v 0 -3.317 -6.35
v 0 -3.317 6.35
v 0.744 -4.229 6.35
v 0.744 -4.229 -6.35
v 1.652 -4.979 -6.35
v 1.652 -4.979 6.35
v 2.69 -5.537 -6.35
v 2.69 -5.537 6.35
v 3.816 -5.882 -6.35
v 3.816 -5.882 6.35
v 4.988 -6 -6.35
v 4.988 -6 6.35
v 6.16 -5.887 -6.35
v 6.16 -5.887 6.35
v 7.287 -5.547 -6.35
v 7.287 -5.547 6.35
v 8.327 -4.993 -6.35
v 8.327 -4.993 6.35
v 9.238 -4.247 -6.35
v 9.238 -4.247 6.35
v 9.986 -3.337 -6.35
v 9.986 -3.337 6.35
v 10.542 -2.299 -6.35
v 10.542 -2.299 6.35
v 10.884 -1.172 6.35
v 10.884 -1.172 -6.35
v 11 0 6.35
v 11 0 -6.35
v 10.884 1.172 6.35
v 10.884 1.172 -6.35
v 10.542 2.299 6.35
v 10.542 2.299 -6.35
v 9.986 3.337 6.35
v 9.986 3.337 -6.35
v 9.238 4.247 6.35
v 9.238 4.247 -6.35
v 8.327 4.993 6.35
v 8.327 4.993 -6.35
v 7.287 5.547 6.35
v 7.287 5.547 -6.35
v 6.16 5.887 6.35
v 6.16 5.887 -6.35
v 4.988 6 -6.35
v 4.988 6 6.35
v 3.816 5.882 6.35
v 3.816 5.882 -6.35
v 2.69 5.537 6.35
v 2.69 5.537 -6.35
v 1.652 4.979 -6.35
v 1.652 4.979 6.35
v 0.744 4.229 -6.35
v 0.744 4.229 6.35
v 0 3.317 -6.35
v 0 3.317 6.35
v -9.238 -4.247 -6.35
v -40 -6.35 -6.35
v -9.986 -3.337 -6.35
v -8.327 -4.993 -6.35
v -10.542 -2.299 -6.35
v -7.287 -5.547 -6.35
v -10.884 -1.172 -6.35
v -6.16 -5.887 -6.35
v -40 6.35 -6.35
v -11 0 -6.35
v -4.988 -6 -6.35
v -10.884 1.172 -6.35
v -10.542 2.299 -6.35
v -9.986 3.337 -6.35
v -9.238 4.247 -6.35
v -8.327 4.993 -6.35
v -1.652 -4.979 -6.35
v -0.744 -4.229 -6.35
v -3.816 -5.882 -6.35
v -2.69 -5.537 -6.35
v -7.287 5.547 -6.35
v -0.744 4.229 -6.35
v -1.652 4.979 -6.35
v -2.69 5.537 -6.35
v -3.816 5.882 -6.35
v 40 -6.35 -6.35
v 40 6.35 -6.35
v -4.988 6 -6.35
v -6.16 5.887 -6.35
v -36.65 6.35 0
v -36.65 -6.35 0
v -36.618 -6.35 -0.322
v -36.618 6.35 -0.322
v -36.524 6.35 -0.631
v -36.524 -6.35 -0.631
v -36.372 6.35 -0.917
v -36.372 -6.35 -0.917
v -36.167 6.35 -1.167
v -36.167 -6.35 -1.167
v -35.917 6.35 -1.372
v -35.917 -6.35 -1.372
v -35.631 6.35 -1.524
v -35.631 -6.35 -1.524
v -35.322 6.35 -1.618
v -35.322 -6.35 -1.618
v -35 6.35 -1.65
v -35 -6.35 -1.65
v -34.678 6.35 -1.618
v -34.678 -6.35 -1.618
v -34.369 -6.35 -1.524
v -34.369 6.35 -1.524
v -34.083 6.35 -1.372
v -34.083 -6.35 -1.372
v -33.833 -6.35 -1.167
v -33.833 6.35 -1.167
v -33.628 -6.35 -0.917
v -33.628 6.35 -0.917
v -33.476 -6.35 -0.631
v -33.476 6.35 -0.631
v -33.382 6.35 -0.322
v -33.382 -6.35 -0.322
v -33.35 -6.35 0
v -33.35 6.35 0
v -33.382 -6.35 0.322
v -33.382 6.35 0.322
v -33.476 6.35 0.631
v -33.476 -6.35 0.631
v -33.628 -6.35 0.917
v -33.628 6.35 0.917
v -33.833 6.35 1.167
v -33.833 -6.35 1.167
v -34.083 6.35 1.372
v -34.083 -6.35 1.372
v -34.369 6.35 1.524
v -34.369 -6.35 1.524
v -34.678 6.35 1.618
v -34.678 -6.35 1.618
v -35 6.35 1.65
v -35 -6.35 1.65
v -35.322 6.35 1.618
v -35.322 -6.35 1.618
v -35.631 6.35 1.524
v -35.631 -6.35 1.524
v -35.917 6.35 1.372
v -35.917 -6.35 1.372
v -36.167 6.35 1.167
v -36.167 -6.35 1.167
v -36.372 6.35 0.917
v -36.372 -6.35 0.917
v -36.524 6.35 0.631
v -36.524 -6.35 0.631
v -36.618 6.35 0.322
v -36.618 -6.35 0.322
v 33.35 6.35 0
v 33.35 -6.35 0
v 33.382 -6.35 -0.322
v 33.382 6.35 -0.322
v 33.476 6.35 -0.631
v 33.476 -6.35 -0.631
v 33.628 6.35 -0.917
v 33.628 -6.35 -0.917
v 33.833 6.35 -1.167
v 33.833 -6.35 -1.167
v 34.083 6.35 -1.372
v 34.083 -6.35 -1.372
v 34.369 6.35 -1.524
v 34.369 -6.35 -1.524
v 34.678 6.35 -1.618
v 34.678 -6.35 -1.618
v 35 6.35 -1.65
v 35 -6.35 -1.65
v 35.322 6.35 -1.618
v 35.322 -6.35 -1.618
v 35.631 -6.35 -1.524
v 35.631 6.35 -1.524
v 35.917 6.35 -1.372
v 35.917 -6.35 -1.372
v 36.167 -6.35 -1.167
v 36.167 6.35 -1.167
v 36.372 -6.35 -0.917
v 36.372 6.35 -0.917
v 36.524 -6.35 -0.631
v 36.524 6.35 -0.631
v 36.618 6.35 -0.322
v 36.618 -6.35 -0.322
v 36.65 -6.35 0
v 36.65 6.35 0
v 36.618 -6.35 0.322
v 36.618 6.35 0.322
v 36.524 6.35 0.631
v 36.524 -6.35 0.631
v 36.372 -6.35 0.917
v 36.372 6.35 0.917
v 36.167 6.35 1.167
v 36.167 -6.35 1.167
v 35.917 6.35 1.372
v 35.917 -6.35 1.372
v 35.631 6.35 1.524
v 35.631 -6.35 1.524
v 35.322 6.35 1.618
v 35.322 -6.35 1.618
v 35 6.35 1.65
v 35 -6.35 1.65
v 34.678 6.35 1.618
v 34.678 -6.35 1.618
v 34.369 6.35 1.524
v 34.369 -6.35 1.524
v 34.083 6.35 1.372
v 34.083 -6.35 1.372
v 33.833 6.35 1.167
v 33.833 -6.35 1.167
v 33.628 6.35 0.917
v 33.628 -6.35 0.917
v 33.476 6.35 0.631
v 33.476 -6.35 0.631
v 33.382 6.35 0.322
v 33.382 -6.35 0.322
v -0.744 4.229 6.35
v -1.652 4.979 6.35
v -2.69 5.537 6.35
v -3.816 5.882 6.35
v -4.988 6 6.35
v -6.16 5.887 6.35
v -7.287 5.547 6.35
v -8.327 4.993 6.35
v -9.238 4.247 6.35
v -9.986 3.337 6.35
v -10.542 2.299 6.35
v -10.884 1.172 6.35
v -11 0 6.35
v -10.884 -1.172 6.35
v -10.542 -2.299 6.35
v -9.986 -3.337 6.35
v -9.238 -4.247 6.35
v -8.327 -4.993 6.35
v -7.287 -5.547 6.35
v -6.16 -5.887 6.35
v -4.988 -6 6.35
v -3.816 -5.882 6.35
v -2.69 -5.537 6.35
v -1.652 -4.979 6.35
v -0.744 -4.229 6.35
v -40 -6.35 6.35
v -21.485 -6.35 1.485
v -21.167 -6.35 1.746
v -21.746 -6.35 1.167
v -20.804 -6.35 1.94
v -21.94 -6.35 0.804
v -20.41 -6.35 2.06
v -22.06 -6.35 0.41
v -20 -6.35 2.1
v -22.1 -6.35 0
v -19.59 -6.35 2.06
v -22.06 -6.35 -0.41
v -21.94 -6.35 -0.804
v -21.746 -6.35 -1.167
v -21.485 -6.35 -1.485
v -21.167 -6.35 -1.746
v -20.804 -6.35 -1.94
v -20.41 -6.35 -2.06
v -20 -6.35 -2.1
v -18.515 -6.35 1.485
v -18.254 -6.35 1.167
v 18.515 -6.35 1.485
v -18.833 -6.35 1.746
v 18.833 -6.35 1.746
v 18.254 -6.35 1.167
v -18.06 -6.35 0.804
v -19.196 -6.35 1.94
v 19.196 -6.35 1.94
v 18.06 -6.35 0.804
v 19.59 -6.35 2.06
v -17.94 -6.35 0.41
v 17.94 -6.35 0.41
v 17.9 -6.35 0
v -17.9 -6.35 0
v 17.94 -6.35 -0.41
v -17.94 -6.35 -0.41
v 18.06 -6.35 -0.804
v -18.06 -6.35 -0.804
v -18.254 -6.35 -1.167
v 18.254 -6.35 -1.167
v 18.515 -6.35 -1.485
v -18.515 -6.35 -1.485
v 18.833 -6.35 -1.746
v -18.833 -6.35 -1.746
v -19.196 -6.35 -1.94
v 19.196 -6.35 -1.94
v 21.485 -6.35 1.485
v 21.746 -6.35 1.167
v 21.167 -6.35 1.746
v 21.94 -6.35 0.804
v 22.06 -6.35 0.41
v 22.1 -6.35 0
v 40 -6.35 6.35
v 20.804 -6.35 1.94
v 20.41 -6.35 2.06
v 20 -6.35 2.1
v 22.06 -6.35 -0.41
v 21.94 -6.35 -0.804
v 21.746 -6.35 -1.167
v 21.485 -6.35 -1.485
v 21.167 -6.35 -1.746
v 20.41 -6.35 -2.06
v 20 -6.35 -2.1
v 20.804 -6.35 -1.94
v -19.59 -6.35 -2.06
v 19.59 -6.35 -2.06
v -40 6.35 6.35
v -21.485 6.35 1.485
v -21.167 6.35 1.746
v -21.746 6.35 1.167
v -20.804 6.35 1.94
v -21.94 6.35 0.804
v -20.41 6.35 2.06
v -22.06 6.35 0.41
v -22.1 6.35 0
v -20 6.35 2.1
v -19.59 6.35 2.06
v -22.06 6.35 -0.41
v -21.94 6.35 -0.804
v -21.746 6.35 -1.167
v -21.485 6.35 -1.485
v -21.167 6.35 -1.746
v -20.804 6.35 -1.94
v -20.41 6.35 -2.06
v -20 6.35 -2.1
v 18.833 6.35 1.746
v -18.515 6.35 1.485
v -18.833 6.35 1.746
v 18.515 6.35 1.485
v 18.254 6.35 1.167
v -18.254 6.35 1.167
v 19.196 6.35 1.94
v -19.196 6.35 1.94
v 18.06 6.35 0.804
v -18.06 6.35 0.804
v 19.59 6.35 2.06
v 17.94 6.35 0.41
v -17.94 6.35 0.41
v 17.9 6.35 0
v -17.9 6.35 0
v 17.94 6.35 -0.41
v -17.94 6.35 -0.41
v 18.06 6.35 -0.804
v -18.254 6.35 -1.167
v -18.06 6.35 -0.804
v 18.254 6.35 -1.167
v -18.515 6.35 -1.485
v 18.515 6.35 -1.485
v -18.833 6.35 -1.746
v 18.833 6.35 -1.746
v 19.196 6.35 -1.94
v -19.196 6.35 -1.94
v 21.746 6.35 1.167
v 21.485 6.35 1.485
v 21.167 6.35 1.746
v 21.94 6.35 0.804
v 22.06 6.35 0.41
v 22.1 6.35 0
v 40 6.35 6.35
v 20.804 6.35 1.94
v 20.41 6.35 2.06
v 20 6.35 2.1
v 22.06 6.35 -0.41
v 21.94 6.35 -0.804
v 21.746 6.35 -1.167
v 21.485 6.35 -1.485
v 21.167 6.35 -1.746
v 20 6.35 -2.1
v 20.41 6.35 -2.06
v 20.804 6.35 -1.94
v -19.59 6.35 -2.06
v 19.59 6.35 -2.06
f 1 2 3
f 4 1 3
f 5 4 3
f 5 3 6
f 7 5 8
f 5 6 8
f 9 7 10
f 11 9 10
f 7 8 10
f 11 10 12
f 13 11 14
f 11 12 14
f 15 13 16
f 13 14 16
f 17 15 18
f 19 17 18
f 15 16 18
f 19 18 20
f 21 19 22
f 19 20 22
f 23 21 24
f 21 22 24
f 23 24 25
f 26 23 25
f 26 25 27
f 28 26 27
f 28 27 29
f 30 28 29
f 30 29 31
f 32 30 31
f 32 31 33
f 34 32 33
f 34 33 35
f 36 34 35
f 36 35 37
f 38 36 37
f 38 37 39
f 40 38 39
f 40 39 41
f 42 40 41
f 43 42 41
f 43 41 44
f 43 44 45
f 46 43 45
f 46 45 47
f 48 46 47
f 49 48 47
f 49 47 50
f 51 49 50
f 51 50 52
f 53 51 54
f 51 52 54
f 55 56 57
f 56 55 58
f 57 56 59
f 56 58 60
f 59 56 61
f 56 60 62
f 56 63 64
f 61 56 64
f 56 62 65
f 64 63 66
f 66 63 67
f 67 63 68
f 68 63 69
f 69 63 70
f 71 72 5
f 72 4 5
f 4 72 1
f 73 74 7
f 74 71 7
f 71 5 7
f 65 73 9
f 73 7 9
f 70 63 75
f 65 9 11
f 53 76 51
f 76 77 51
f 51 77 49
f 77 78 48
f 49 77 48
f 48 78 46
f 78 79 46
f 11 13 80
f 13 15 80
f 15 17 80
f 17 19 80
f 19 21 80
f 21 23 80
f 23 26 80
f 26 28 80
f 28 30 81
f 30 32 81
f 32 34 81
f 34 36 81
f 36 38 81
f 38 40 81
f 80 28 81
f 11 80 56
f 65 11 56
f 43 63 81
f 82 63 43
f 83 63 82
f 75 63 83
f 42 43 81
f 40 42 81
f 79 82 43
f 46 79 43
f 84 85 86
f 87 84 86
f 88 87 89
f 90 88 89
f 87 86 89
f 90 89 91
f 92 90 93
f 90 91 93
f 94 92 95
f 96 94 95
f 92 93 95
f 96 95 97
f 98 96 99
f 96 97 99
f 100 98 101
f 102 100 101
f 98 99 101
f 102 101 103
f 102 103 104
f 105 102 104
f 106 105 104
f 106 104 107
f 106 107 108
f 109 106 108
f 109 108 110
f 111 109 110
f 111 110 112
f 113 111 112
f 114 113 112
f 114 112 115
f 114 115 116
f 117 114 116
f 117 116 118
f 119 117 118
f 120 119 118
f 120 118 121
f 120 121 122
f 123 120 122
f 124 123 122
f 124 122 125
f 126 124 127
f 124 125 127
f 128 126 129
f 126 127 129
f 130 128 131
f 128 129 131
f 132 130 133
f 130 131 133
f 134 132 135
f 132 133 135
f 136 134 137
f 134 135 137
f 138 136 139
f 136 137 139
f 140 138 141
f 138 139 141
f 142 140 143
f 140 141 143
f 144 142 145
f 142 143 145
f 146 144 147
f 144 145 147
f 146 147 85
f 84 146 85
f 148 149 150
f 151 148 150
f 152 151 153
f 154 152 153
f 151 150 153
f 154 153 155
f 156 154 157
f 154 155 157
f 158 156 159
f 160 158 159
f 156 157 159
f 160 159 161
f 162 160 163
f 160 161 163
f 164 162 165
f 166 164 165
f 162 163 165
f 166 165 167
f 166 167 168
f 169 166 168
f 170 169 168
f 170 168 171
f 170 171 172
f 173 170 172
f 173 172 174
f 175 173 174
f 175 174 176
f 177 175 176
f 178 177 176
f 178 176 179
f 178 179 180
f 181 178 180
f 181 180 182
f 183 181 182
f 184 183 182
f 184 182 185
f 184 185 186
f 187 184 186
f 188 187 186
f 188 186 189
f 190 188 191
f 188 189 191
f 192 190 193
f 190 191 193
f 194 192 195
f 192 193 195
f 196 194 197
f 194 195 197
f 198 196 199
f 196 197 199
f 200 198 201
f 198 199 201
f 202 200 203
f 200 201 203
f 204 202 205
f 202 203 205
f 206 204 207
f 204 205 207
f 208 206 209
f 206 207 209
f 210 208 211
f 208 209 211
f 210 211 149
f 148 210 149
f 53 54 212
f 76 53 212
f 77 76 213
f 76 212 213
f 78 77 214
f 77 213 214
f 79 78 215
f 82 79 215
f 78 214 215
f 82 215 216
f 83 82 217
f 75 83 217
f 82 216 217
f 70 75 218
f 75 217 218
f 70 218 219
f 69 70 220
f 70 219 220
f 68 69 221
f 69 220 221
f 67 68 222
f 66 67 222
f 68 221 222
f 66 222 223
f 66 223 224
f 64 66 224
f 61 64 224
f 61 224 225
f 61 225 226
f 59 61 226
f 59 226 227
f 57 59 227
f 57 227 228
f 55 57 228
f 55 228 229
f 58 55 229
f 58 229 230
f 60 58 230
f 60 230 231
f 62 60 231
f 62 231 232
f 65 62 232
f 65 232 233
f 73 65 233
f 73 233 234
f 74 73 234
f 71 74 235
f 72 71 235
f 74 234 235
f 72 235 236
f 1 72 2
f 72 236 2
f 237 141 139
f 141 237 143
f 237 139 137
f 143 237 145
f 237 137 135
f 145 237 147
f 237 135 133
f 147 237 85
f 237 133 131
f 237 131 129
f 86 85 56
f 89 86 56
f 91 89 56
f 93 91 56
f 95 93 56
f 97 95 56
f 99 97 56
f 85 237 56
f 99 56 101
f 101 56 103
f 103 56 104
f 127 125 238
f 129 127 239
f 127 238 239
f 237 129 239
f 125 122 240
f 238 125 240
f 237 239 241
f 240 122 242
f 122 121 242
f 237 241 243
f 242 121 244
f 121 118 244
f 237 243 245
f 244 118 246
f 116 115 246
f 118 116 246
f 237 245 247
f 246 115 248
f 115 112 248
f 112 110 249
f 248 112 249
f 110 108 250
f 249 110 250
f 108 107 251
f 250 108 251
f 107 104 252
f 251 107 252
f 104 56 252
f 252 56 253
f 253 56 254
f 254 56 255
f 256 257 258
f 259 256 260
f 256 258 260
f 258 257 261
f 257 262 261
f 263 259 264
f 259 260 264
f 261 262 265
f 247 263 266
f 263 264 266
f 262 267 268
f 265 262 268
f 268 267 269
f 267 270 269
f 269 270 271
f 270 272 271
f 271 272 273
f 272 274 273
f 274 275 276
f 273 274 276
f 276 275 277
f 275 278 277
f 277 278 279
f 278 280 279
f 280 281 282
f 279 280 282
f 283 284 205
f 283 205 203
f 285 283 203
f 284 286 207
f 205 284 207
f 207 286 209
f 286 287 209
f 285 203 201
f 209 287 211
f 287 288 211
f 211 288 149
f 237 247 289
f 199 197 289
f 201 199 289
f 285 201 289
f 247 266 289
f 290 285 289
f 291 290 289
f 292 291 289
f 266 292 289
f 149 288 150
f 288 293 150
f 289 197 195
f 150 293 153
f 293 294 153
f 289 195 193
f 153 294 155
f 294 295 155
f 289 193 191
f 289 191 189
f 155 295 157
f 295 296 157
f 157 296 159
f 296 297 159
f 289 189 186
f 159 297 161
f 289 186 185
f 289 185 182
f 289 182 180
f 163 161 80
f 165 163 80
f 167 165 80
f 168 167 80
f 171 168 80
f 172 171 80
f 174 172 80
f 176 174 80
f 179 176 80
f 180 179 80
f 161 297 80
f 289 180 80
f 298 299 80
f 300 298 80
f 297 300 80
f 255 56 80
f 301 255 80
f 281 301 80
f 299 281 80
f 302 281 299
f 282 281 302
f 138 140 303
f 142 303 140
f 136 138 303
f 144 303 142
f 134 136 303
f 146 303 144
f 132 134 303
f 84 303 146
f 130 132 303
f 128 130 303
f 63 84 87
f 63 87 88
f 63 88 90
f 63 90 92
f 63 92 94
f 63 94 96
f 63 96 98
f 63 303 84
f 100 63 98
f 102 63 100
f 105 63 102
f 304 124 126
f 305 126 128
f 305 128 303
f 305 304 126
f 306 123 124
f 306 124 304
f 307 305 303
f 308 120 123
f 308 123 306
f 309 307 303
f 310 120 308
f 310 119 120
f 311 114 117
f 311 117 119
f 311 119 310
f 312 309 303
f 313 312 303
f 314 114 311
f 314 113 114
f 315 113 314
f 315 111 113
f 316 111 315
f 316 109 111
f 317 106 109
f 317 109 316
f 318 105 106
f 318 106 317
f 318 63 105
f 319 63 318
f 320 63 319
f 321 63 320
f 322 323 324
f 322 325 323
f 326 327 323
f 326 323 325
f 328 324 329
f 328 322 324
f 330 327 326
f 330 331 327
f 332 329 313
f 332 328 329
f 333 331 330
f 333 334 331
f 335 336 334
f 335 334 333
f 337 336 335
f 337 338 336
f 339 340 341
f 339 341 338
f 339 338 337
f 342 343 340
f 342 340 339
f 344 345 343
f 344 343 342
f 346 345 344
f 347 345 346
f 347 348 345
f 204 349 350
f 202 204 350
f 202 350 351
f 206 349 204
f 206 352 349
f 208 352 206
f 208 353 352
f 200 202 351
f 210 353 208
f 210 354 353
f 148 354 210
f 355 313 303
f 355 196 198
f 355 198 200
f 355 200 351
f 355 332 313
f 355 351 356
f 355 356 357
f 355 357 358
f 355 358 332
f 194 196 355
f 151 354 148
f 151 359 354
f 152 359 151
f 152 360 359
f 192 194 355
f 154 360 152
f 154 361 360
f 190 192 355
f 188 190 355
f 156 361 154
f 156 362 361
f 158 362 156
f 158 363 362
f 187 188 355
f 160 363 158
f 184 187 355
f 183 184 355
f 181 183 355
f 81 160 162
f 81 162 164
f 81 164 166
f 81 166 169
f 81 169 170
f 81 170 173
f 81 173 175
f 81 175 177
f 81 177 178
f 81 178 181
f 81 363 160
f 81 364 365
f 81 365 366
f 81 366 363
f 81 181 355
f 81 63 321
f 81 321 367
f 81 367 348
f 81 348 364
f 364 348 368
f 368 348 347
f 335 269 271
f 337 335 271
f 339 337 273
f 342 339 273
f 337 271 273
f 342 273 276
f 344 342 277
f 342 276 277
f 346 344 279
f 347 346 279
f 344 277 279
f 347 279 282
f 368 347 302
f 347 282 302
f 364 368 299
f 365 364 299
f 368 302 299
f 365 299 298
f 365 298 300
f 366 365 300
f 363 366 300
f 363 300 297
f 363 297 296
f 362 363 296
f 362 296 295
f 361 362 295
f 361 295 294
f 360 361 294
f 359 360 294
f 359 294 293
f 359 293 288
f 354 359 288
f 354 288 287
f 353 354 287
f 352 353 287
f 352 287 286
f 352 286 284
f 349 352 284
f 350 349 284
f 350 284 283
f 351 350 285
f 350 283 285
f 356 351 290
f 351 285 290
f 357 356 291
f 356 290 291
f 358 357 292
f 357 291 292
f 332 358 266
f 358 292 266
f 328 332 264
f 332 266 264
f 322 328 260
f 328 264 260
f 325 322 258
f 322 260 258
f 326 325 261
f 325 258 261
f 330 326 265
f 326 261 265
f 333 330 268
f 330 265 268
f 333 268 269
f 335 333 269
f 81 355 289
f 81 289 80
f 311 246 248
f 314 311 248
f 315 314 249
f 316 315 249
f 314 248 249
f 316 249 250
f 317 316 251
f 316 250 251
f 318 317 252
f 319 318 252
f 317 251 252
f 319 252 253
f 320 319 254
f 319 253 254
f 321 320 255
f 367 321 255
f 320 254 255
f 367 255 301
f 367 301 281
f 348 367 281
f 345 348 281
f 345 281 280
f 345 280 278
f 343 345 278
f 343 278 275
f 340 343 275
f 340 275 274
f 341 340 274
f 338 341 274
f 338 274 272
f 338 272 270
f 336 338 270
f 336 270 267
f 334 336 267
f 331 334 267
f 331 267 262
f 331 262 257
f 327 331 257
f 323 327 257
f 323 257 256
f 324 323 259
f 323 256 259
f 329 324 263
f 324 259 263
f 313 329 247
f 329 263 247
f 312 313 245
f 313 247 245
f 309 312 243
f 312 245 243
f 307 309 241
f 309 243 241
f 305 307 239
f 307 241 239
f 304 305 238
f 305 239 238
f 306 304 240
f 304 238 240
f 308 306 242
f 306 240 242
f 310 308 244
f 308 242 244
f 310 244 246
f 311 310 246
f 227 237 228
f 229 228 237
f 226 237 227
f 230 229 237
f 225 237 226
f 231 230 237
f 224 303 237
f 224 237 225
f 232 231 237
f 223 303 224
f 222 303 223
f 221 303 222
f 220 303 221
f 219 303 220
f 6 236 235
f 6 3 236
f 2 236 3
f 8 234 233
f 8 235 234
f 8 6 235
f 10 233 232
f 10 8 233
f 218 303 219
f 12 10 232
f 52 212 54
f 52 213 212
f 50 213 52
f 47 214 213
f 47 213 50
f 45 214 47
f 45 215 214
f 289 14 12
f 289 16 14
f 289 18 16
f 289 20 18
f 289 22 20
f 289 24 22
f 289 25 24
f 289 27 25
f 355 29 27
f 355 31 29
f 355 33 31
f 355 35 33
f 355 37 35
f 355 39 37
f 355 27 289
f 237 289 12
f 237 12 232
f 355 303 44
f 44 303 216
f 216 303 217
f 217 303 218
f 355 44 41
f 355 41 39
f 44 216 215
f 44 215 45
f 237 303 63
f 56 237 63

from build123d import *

# Parameters (mm, degrees)
SKETCH1_W                 = 80
SKETCH1_H                 = 12.7
BOSS_EXTRUDE1_DEPTH       = 6.35
SKETCH2_R                 = 6
CUT_EXTRUDE1_DEPTH        = 13.7
M4X0_7_TAPPED_HOLE2_D     = 3.3
M4X0_7_TAPPED_HOLE2_DEPTH = 12.7
M5X0_8_TAPPED_HOLE2_D     = 4.2
M5X0_8_TAPPED_HOLE2_DEPTH = 12.7


with BuildPart() as part:
    # Sketch1 → Boss-Extrude1 (new body, symmetric)
    with BuildSketch(Plane(origin=(0, 0, 0), x_dir=(1, 0, 0), z_dir=(0, 1, 0))):
        Rectangle(SKETCH1_W, SKETCH1_H)
    extrude(amount=BOSS_EXTRUDE1_DEPTH, both=True)

    # Sketch2 → Cut-Extrude1 (cut, through all)
    with BuildSketch(Plane.XY.offset(6.35)):
        with Locations((-5, 0)):
            Circle(SKETCH2_R)
        with Locations((5, 0)):
            Circle(SKETCH2_R)
    extrude(amount=-CUT_EXTRUDE1_DEPTH, mode=Mode.SUBTRACT)

    # M4x0.7 Tapped Hole2
    with Locations(Plane(origin=(0, 6.35, 0), x_dir=(1, 0, 0), z_dir=(0, 1, 0))):
        with Locations((-35, 0), (35, 0)):
            Hole(M4X0_7_TAPPED_HOLE2_D / 2, depth=M4X0_7_TAPPED_HOLE2_DEPTH)

    # M5x0.8 Tapped Hole2
    with Locations(Plane(origin=(0, 6.35, 0), x_dir=(1, 0, 0), z_dir=(0, 1, 0))):
        with Locations((20, 0), (-20, 0)):
            Hole(M5X0_8_TAPPED_HOLE2_D / 2, depth=M5X0_8_TAPPED_HOLE2_DEPTH)


solid = part.part
